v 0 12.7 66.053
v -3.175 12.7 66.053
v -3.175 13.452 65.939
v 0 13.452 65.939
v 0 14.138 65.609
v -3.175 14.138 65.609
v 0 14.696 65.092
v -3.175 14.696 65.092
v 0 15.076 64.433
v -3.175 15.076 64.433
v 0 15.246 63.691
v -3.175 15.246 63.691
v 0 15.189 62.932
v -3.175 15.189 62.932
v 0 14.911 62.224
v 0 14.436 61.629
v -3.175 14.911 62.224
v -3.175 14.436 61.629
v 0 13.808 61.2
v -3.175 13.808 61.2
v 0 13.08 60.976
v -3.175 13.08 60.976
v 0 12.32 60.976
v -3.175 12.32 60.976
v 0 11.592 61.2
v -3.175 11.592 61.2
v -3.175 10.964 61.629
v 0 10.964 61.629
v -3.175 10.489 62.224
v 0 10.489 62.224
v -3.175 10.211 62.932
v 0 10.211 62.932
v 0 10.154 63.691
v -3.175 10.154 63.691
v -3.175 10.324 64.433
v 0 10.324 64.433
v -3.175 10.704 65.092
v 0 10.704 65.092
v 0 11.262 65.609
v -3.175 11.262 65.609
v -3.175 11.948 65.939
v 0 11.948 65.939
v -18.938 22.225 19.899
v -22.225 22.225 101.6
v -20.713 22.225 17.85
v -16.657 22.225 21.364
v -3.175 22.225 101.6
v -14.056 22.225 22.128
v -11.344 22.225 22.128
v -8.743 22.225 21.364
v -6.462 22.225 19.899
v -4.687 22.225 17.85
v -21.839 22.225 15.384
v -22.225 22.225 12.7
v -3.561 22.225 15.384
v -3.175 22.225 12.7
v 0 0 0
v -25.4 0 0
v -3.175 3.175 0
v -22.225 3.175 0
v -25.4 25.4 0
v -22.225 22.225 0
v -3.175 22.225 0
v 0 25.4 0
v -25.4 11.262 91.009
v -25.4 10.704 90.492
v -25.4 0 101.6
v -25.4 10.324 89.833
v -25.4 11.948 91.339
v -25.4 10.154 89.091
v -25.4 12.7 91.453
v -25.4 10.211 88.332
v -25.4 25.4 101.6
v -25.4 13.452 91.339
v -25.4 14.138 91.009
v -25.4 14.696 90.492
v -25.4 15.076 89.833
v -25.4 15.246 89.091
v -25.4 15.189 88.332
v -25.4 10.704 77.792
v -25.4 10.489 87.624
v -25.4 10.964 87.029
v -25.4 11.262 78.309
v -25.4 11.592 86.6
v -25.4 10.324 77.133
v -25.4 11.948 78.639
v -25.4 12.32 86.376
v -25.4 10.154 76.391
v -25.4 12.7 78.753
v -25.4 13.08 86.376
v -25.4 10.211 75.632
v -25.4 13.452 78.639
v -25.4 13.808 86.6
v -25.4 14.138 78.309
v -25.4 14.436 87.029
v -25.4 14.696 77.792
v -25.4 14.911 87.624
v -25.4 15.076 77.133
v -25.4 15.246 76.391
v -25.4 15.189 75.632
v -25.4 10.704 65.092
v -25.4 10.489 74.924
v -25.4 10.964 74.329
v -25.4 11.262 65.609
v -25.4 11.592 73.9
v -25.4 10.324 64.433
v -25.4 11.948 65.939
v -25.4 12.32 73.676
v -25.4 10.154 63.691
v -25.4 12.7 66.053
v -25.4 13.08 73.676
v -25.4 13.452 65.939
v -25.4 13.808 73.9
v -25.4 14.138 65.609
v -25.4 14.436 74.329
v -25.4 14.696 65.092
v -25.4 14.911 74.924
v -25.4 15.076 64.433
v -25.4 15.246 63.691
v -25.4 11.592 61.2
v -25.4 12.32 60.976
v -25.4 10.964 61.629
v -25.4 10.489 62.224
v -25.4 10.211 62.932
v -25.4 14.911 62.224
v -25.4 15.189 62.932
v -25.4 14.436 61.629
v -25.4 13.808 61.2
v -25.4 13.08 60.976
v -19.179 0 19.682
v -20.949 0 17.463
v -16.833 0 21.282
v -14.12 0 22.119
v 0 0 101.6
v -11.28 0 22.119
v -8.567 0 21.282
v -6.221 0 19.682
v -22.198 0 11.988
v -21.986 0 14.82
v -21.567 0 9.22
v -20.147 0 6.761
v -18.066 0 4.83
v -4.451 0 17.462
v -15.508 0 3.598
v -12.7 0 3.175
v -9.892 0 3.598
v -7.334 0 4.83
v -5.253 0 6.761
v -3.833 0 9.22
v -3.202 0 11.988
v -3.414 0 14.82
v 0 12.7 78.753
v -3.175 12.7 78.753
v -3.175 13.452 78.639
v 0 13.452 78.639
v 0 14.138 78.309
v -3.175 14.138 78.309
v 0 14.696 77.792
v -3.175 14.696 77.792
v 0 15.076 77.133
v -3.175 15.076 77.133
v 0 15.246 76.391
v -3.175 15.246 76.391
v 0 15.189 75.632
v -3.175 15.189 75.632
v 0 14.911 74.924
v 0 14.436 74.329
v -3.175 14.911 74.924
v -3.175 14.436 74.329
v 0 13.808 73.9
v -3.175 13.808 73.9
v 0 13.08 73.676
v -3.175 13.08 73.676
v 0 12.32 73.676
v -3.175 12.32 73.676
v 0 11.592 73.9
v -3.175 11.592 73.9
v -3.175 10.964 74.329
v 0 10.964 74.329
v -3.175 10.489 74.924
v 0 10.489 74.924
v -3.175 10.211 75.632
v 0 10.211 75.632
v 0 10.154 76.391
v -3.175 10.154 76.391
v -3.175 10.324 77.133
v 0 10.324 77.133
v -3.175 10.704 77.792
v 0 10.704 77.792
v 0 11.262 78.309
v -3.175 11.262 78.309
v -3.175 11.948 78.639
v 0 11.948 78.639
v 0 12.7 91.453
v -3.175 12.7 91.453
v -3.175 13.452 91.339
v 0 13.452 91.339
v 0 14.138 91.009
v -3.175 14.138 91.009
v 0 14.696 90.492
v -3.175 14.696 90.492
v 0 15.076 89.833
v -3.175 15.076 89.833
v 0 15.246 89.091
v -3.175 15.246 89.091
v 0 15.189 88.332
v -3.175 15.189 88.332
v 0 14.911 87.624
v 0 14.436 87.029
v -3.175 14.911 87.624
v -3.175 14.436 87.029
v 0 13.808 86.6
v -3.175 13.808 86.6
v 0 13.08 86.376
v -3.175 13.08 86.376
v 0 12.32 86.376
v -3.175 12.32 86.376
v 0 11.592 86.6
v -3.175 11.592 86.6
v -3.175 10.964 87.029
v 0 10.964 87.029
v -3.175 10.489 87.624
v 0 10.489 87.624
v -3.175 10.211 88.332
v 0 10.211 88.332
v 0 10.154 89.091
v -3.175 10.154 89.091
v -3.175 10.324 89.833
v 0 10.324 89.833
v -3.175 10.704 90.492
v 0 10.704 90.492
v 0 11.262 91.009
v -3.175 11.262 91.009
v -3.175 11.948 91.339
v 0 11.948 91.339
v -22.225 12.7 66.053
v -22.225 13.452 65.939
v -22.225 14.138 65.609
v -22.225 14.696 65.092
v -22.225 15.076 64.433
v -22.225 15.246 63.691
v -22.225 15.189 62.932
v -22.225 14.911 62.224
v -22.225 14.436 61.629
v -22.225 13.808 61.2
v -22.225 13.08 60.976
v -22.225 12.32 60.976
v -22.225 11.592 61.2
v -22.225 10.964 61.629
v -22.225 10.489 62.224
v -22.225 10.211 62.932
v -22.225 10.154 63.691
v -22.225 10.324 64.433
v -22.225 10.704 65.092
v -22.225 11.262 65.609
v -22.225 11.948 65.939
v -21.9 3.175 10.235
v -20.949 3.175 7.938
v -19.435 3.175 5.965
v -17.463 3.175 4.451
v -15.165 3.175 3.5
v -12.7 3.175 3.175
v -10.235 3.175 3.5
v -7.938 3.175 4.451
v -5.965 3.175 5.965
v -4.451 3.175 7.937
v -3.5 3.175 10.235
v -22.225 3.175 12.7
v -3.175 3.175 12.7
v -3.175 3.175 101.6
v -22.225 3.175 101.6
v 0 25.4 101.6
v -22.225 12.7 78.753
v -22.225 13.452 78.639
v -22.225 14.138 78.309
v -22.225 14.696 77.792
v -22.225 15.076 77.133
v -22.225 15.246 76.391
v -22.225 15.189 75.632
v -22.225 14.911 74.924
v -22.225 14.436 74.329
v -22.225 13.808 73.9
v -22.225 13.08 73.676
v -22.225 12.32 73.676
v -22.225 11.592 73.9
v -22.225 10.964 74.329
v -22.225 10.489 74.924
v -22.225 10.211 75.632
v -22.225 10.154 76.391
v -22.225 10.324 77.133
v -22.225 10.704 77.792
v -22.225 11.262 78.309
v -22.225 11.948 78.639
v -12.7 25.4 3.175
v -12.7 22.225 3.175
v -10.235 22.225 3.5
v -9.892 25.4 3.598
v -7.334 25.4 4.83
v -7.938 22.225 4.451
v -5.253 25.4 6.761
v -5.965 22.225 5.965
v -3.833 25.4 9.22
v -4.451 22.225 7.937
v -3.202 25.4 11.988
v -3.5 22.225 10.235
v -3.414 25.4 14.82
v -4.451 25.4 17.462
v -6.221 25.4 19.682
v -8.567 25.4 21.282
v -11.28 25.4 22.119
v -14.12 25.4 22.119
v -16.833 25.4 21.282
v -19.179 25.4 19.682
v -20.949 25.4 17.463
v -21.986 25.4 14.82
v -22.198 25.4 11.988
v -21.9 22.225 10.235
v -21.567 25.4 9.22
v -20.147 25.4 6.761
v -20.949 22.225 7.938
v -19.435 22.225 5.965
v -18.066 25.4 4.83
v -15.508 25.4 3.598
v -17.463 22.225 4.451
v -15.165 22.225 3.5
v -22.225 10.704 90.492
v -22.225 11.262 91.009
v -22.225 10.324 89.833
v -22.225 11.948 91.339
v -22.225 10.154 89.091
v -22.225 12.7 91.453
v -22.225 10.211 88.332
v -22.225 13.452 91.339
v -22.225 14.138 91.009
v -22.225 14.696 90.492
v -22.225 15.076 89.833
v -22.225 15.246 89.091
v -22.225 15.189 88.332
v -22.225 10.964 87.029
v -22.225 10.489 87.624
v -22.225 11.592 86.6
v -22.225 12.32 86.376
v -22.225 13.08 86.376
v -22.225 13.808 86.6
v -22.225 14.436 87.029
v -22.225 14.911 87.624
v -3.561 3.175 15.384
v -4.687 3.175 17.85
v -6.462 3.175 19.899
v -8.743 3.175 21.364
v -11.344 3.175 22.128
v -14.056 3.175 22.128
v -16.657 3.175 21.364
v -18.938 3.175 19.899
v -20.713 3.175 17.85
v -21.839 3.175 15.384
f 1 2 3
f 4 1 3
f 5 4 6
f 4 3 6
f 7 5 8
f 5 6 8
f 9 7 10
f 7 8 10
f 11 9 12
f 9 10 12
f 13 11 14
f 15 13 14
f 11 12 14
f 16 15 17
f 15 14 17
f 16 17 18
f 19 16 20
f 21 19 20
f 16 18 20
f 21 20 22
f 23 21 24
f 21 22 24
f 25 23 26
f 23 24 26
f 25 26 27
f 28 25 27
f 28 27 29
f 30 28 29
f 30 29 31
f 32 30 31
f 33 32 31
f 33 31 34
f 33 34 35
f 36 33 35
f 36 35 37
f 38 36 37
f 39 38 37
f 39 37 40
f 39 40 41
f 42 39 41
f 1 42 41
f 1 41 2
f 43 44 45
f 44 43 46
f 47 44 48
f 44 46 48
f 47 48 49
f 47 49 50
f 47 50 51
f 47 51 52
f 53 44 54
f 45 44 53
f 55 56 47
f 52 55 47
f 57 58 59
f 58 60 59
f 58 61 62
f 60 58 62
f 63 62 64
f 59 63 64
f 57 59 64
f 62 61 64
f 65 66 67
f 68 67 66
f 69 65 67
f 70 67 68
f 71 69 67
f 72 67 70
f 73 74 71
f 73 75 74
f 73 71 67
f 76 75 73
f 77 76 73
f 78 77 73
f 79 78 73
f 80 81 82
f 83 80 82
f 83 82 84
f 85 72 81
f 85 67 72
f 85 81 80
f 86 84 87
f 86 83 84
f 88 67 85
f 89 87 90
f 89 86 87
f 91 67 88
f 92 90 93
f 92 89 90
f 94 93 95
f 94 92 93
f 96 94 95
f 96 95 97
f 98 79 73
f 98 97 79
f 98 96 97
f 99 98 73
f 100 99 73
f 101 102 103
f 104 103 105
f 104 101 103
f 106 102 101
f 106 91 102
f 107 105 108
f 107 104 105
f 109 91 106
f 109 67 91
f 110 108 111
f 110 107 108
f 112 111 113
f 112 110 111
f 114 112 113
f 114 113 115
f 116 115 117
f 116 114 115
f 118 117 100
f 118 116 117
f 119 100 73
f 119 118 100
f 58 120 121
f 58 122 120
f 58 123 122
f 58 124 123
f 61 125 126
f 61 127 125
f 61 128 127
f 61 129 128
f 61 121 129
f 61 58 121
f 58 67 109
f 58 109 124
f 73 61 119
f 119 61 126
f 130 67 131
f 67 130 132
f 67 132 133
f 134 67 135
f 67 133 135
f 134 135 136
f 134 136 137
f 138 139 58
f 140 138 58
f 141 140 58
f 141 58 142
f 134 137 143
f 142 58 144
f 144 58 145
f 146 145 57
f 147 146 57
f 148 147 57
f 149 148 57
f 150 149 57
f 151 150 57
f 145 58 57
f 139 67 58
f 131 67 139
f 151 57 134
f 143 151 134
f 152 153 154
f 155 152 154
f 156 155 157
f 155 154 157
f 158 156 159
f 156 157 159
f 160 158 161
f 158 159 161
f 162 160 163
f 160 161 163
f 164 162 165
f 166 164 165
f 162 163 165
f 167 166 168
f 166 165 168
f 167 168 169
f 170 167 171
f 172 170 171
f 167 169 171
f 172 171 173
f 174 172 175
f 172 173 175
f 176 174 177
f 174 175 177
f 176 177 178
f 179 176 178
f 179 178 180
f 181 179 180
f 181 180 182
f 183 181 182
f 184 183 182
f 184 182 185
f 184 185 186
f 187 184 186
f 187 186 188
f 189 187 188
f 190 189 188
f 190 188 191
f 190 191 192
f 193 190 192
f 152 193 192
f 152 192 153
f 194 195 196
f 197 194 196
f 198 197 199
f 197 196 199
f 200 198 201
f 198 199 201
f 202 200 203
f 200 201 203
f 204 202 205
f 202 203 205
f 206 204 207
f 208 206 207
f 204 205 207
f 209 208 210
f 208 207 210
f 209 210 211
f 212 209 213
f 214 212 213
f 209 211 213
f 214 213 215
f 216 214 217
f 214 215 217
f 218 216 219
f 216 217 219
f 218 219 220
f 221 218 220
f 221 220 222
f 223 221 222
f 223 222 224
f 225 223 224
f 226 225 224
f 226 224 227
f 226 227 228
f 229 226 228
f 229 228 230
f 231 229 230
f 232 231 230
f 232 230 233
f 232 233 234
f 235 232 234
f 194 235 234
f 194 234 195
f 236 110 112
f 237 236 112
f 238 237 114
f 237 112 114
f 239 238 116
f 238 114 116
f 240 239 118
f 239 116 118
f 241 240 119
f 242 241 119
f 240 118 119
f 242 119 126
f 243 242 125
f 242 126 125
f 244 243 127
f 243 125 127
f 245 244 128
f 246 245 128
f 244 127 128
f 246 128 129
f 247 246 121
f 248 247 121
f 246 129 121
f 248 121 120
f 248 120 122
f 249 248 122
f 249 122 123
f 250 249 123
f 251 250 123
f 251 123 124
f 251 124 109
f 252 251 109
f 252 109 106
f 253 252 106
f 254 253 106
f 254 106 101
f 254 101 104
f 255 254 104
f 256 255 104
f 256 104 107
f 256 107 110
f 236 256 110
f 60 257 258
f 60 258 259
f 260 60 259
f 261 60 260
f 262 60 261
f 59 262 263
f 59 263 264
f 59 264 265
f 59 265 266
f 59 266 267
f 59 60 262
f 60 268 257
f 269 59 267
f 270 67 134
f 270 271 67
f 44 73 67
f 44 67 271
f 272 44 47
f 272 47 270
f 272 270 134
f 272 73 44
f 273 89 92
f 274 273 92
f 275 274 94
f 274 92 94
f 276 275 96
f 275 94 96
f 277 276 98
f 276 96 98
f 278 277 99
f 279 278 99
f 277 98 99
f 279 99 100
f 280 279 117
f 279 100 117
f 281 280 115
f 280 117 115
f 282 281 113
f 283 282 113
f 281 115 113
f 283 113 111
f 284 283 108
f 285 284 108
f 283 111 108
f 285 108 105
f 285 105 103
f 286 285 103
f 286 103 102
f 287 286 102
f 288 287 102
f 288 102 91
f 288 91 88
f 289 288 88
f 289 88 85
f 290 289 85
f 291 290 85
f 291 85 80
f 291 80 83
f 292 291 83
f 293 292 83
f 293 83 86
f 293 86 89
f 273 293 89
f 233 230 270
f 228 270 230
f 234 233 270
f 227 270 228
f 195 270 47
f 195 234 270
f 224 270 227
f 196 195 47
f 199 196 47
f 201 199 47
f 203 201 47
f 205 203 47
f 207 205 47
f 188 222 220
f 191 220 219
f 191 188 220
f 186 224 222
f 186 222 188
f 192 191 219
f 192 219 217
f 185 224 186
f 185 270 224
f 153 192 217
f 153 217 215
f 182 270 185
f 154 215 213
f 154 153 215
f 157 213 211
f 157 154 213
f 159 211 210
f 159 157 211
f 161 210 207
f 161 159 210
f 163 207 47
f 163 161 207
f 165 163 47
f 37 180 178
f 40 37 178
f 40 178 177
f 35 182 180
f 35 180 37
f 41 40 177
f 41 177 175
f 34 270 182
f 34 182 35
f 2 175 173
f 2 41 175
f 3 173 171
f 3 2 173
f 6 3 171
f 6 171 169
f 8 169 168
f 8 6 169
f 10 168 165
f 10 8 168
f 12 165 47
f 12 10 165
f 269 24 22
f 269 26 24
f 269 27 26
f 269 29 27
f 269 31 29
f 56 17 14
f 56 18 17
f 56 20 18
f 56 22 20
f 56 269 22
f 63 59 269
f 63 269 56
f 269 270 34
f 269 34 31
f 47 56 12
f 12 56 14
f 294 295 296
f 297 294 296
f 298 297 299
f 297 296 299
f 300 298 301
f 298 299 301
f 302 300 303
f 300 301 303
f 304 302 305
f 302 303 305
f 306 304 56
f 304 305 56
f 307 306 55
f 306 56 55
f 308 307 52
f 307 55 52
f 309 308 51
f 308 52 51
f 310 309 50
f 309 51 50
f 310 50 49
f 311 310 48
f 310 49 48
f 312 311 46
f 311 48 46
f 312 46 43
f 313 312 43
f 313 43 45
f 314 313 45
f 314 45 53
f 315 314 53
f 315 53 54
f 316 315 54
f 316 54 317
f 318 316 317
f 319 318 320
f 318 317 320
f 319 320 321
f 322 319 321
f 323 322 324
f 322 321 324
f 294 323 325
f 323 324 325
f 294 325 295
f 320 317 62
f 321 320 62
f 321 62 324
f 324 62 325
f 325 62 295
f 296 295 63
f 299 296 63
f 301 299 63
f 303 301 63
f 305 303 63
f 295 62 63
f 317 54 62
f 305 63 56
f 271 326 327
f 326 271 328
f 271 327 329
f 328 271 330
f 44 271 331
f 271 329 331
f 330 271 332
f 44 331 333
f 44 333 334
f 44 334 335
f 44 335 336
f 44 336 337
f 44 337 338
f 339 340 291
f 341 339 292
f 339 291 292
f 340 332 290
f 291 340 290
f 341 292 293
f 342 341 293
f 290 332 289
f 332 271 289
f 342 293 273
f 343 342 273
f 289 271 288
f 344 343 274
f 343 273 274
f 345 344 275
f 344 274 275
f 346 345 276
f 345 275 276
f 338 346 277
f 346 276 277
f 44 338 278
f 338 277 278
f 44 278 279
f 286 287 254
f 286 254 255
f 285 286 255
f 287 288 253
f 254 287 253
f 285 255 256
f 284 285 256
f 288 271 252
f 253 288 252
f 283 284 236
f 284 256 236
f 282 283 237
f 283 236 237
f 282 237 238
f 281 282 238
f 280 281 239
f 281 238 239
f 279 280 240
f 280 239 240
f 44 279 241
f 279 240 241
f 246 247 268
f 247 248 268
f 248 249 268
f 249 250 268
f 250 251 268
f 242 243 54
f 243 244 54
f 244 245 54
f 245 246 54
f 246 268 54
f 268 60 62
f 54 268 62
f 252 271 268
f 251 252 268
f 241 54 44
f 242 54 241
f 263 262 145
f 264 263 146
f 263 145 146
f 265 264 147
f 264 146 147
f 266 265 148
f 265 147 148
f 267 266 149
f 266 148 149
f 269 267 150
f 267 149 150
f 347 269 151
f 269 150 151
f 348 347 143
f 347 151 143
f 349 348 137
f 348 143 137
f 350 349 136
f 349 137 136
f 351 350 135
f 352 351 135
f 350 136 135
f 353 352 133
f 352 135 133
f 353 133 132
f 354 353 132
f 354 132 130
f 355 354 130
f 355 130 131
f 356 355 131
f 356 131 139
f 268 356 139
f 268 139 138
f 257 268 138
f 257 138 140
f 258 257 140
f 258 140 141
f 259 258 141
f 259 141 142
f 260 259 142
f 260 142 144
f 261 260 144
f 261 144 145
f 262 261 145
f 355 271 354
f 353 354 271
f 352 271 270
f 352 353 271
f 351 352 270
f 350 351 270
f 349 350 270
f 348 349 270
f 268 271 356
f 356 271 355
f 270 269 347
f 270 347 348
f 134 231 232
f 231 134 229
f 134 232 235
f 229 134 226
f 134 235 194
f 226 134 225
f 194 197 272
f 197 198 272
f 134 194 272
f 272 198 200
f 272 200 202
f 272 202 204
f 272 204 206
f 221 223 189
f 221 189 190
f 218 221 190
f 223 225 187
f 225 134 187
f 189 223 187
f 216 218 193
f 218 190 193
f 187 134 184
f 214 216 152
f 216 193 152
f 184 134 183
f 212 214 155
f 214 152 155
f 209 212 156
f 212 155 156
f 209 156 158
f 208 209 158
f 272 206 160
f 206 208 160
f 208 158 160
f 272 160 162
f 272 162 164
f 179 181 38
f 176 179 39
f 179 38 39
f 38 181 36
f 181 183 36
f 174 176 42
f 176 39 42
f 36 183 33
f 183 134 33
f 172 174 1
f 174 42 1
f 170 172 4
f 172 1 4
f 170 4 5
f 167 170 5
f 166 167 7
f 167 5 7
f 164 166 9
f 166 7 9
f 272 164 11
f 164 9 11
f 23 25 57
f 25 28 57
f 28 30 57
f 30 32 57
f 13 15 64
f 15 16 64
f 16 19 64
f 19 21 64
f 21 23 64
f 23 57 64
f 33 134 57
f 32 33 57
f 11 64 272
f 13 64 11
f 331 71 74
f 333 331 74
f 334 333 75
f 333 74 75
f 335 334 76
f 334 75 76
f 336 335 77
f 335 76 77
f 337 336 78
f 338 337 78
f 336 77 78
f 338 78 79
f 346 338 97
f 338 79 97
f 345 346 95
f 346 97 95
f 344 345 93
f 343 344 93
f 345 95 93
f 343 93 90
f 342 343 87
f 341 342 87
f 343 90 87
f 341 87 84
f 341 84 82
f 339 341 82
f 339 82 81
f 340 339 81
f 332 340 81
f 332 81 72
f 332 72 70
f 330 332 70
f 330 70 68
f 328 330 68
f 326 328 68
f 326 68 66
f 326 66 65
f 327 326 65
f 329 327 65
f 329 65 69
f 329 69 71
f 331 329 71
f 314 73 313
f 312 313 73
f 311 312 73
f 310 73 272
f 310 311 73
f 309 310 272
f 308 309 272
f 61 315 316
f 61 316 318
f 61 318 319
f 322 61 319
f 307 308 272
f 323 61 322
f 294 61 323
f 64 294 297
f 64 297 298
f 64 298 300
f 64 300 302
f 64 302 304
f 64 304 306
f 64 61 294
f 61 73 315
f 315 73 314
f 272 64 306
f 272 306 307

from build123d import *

# Parameters (mm, degrees)
SKETCH1_W              = 25.4
SKETCH1_H              = 25.4
SKETCH1_W_2            = 19.05
SKETCH1_H_2            = 19.05
EXTRUDE_THIN1_DEPTH    = 101.6
SKETCH2_R              = 9.525
CUT_EXTRUDE1_DEPTH     = 108.763073453
F_10_CLEARANCE_HOLE1_D = 5.1054


with BuildPart() as part:
    # Sketch1 → Extrude-Thin1 (new body)
    with BuildSketch(Plane.XY):
        with Locations((-12.7, 12.7)):
            Rectangle(SKETCH1_W, SKETCH1_H)
        with Locations((-12.7, 12.7)):
            Rectangle(SKETCH1_W_2, SKETCH1_H_2, mode=Mode.SUBTRACT)
    extrude(amount=EXTRUDE_THIN1_DEPTH)

    # Sketch2 → Cut-Extrude1 (cut, through all)
    with BuildSketch(Plane(origin=(0, 0, 0), x_dir=(-1, 0, 0), z_dir=(0, -1, 0))):
        with Locations(Location((12.7, -12.7, 0), (0, 0, 90))):
            Circle(SKETCH2_R)
    extrude(amount=-CUT_EXTRUDE1_DEPTH, mode=Mode.SUBTRACT)

    # #10 Clearance Hole1 (through all)
    with Locations(Plane(origin=(0, 0, 0), x_dir=(0, 0, -1), z_dir=(1, 0, 0))):
        with Locations((-76.2, 12.7), (-88.9, 12.7), (-63.5, 12.7)):
            Hole(F_10_CLEARANCE_HOLE1_D / 2)


solid = part.part
